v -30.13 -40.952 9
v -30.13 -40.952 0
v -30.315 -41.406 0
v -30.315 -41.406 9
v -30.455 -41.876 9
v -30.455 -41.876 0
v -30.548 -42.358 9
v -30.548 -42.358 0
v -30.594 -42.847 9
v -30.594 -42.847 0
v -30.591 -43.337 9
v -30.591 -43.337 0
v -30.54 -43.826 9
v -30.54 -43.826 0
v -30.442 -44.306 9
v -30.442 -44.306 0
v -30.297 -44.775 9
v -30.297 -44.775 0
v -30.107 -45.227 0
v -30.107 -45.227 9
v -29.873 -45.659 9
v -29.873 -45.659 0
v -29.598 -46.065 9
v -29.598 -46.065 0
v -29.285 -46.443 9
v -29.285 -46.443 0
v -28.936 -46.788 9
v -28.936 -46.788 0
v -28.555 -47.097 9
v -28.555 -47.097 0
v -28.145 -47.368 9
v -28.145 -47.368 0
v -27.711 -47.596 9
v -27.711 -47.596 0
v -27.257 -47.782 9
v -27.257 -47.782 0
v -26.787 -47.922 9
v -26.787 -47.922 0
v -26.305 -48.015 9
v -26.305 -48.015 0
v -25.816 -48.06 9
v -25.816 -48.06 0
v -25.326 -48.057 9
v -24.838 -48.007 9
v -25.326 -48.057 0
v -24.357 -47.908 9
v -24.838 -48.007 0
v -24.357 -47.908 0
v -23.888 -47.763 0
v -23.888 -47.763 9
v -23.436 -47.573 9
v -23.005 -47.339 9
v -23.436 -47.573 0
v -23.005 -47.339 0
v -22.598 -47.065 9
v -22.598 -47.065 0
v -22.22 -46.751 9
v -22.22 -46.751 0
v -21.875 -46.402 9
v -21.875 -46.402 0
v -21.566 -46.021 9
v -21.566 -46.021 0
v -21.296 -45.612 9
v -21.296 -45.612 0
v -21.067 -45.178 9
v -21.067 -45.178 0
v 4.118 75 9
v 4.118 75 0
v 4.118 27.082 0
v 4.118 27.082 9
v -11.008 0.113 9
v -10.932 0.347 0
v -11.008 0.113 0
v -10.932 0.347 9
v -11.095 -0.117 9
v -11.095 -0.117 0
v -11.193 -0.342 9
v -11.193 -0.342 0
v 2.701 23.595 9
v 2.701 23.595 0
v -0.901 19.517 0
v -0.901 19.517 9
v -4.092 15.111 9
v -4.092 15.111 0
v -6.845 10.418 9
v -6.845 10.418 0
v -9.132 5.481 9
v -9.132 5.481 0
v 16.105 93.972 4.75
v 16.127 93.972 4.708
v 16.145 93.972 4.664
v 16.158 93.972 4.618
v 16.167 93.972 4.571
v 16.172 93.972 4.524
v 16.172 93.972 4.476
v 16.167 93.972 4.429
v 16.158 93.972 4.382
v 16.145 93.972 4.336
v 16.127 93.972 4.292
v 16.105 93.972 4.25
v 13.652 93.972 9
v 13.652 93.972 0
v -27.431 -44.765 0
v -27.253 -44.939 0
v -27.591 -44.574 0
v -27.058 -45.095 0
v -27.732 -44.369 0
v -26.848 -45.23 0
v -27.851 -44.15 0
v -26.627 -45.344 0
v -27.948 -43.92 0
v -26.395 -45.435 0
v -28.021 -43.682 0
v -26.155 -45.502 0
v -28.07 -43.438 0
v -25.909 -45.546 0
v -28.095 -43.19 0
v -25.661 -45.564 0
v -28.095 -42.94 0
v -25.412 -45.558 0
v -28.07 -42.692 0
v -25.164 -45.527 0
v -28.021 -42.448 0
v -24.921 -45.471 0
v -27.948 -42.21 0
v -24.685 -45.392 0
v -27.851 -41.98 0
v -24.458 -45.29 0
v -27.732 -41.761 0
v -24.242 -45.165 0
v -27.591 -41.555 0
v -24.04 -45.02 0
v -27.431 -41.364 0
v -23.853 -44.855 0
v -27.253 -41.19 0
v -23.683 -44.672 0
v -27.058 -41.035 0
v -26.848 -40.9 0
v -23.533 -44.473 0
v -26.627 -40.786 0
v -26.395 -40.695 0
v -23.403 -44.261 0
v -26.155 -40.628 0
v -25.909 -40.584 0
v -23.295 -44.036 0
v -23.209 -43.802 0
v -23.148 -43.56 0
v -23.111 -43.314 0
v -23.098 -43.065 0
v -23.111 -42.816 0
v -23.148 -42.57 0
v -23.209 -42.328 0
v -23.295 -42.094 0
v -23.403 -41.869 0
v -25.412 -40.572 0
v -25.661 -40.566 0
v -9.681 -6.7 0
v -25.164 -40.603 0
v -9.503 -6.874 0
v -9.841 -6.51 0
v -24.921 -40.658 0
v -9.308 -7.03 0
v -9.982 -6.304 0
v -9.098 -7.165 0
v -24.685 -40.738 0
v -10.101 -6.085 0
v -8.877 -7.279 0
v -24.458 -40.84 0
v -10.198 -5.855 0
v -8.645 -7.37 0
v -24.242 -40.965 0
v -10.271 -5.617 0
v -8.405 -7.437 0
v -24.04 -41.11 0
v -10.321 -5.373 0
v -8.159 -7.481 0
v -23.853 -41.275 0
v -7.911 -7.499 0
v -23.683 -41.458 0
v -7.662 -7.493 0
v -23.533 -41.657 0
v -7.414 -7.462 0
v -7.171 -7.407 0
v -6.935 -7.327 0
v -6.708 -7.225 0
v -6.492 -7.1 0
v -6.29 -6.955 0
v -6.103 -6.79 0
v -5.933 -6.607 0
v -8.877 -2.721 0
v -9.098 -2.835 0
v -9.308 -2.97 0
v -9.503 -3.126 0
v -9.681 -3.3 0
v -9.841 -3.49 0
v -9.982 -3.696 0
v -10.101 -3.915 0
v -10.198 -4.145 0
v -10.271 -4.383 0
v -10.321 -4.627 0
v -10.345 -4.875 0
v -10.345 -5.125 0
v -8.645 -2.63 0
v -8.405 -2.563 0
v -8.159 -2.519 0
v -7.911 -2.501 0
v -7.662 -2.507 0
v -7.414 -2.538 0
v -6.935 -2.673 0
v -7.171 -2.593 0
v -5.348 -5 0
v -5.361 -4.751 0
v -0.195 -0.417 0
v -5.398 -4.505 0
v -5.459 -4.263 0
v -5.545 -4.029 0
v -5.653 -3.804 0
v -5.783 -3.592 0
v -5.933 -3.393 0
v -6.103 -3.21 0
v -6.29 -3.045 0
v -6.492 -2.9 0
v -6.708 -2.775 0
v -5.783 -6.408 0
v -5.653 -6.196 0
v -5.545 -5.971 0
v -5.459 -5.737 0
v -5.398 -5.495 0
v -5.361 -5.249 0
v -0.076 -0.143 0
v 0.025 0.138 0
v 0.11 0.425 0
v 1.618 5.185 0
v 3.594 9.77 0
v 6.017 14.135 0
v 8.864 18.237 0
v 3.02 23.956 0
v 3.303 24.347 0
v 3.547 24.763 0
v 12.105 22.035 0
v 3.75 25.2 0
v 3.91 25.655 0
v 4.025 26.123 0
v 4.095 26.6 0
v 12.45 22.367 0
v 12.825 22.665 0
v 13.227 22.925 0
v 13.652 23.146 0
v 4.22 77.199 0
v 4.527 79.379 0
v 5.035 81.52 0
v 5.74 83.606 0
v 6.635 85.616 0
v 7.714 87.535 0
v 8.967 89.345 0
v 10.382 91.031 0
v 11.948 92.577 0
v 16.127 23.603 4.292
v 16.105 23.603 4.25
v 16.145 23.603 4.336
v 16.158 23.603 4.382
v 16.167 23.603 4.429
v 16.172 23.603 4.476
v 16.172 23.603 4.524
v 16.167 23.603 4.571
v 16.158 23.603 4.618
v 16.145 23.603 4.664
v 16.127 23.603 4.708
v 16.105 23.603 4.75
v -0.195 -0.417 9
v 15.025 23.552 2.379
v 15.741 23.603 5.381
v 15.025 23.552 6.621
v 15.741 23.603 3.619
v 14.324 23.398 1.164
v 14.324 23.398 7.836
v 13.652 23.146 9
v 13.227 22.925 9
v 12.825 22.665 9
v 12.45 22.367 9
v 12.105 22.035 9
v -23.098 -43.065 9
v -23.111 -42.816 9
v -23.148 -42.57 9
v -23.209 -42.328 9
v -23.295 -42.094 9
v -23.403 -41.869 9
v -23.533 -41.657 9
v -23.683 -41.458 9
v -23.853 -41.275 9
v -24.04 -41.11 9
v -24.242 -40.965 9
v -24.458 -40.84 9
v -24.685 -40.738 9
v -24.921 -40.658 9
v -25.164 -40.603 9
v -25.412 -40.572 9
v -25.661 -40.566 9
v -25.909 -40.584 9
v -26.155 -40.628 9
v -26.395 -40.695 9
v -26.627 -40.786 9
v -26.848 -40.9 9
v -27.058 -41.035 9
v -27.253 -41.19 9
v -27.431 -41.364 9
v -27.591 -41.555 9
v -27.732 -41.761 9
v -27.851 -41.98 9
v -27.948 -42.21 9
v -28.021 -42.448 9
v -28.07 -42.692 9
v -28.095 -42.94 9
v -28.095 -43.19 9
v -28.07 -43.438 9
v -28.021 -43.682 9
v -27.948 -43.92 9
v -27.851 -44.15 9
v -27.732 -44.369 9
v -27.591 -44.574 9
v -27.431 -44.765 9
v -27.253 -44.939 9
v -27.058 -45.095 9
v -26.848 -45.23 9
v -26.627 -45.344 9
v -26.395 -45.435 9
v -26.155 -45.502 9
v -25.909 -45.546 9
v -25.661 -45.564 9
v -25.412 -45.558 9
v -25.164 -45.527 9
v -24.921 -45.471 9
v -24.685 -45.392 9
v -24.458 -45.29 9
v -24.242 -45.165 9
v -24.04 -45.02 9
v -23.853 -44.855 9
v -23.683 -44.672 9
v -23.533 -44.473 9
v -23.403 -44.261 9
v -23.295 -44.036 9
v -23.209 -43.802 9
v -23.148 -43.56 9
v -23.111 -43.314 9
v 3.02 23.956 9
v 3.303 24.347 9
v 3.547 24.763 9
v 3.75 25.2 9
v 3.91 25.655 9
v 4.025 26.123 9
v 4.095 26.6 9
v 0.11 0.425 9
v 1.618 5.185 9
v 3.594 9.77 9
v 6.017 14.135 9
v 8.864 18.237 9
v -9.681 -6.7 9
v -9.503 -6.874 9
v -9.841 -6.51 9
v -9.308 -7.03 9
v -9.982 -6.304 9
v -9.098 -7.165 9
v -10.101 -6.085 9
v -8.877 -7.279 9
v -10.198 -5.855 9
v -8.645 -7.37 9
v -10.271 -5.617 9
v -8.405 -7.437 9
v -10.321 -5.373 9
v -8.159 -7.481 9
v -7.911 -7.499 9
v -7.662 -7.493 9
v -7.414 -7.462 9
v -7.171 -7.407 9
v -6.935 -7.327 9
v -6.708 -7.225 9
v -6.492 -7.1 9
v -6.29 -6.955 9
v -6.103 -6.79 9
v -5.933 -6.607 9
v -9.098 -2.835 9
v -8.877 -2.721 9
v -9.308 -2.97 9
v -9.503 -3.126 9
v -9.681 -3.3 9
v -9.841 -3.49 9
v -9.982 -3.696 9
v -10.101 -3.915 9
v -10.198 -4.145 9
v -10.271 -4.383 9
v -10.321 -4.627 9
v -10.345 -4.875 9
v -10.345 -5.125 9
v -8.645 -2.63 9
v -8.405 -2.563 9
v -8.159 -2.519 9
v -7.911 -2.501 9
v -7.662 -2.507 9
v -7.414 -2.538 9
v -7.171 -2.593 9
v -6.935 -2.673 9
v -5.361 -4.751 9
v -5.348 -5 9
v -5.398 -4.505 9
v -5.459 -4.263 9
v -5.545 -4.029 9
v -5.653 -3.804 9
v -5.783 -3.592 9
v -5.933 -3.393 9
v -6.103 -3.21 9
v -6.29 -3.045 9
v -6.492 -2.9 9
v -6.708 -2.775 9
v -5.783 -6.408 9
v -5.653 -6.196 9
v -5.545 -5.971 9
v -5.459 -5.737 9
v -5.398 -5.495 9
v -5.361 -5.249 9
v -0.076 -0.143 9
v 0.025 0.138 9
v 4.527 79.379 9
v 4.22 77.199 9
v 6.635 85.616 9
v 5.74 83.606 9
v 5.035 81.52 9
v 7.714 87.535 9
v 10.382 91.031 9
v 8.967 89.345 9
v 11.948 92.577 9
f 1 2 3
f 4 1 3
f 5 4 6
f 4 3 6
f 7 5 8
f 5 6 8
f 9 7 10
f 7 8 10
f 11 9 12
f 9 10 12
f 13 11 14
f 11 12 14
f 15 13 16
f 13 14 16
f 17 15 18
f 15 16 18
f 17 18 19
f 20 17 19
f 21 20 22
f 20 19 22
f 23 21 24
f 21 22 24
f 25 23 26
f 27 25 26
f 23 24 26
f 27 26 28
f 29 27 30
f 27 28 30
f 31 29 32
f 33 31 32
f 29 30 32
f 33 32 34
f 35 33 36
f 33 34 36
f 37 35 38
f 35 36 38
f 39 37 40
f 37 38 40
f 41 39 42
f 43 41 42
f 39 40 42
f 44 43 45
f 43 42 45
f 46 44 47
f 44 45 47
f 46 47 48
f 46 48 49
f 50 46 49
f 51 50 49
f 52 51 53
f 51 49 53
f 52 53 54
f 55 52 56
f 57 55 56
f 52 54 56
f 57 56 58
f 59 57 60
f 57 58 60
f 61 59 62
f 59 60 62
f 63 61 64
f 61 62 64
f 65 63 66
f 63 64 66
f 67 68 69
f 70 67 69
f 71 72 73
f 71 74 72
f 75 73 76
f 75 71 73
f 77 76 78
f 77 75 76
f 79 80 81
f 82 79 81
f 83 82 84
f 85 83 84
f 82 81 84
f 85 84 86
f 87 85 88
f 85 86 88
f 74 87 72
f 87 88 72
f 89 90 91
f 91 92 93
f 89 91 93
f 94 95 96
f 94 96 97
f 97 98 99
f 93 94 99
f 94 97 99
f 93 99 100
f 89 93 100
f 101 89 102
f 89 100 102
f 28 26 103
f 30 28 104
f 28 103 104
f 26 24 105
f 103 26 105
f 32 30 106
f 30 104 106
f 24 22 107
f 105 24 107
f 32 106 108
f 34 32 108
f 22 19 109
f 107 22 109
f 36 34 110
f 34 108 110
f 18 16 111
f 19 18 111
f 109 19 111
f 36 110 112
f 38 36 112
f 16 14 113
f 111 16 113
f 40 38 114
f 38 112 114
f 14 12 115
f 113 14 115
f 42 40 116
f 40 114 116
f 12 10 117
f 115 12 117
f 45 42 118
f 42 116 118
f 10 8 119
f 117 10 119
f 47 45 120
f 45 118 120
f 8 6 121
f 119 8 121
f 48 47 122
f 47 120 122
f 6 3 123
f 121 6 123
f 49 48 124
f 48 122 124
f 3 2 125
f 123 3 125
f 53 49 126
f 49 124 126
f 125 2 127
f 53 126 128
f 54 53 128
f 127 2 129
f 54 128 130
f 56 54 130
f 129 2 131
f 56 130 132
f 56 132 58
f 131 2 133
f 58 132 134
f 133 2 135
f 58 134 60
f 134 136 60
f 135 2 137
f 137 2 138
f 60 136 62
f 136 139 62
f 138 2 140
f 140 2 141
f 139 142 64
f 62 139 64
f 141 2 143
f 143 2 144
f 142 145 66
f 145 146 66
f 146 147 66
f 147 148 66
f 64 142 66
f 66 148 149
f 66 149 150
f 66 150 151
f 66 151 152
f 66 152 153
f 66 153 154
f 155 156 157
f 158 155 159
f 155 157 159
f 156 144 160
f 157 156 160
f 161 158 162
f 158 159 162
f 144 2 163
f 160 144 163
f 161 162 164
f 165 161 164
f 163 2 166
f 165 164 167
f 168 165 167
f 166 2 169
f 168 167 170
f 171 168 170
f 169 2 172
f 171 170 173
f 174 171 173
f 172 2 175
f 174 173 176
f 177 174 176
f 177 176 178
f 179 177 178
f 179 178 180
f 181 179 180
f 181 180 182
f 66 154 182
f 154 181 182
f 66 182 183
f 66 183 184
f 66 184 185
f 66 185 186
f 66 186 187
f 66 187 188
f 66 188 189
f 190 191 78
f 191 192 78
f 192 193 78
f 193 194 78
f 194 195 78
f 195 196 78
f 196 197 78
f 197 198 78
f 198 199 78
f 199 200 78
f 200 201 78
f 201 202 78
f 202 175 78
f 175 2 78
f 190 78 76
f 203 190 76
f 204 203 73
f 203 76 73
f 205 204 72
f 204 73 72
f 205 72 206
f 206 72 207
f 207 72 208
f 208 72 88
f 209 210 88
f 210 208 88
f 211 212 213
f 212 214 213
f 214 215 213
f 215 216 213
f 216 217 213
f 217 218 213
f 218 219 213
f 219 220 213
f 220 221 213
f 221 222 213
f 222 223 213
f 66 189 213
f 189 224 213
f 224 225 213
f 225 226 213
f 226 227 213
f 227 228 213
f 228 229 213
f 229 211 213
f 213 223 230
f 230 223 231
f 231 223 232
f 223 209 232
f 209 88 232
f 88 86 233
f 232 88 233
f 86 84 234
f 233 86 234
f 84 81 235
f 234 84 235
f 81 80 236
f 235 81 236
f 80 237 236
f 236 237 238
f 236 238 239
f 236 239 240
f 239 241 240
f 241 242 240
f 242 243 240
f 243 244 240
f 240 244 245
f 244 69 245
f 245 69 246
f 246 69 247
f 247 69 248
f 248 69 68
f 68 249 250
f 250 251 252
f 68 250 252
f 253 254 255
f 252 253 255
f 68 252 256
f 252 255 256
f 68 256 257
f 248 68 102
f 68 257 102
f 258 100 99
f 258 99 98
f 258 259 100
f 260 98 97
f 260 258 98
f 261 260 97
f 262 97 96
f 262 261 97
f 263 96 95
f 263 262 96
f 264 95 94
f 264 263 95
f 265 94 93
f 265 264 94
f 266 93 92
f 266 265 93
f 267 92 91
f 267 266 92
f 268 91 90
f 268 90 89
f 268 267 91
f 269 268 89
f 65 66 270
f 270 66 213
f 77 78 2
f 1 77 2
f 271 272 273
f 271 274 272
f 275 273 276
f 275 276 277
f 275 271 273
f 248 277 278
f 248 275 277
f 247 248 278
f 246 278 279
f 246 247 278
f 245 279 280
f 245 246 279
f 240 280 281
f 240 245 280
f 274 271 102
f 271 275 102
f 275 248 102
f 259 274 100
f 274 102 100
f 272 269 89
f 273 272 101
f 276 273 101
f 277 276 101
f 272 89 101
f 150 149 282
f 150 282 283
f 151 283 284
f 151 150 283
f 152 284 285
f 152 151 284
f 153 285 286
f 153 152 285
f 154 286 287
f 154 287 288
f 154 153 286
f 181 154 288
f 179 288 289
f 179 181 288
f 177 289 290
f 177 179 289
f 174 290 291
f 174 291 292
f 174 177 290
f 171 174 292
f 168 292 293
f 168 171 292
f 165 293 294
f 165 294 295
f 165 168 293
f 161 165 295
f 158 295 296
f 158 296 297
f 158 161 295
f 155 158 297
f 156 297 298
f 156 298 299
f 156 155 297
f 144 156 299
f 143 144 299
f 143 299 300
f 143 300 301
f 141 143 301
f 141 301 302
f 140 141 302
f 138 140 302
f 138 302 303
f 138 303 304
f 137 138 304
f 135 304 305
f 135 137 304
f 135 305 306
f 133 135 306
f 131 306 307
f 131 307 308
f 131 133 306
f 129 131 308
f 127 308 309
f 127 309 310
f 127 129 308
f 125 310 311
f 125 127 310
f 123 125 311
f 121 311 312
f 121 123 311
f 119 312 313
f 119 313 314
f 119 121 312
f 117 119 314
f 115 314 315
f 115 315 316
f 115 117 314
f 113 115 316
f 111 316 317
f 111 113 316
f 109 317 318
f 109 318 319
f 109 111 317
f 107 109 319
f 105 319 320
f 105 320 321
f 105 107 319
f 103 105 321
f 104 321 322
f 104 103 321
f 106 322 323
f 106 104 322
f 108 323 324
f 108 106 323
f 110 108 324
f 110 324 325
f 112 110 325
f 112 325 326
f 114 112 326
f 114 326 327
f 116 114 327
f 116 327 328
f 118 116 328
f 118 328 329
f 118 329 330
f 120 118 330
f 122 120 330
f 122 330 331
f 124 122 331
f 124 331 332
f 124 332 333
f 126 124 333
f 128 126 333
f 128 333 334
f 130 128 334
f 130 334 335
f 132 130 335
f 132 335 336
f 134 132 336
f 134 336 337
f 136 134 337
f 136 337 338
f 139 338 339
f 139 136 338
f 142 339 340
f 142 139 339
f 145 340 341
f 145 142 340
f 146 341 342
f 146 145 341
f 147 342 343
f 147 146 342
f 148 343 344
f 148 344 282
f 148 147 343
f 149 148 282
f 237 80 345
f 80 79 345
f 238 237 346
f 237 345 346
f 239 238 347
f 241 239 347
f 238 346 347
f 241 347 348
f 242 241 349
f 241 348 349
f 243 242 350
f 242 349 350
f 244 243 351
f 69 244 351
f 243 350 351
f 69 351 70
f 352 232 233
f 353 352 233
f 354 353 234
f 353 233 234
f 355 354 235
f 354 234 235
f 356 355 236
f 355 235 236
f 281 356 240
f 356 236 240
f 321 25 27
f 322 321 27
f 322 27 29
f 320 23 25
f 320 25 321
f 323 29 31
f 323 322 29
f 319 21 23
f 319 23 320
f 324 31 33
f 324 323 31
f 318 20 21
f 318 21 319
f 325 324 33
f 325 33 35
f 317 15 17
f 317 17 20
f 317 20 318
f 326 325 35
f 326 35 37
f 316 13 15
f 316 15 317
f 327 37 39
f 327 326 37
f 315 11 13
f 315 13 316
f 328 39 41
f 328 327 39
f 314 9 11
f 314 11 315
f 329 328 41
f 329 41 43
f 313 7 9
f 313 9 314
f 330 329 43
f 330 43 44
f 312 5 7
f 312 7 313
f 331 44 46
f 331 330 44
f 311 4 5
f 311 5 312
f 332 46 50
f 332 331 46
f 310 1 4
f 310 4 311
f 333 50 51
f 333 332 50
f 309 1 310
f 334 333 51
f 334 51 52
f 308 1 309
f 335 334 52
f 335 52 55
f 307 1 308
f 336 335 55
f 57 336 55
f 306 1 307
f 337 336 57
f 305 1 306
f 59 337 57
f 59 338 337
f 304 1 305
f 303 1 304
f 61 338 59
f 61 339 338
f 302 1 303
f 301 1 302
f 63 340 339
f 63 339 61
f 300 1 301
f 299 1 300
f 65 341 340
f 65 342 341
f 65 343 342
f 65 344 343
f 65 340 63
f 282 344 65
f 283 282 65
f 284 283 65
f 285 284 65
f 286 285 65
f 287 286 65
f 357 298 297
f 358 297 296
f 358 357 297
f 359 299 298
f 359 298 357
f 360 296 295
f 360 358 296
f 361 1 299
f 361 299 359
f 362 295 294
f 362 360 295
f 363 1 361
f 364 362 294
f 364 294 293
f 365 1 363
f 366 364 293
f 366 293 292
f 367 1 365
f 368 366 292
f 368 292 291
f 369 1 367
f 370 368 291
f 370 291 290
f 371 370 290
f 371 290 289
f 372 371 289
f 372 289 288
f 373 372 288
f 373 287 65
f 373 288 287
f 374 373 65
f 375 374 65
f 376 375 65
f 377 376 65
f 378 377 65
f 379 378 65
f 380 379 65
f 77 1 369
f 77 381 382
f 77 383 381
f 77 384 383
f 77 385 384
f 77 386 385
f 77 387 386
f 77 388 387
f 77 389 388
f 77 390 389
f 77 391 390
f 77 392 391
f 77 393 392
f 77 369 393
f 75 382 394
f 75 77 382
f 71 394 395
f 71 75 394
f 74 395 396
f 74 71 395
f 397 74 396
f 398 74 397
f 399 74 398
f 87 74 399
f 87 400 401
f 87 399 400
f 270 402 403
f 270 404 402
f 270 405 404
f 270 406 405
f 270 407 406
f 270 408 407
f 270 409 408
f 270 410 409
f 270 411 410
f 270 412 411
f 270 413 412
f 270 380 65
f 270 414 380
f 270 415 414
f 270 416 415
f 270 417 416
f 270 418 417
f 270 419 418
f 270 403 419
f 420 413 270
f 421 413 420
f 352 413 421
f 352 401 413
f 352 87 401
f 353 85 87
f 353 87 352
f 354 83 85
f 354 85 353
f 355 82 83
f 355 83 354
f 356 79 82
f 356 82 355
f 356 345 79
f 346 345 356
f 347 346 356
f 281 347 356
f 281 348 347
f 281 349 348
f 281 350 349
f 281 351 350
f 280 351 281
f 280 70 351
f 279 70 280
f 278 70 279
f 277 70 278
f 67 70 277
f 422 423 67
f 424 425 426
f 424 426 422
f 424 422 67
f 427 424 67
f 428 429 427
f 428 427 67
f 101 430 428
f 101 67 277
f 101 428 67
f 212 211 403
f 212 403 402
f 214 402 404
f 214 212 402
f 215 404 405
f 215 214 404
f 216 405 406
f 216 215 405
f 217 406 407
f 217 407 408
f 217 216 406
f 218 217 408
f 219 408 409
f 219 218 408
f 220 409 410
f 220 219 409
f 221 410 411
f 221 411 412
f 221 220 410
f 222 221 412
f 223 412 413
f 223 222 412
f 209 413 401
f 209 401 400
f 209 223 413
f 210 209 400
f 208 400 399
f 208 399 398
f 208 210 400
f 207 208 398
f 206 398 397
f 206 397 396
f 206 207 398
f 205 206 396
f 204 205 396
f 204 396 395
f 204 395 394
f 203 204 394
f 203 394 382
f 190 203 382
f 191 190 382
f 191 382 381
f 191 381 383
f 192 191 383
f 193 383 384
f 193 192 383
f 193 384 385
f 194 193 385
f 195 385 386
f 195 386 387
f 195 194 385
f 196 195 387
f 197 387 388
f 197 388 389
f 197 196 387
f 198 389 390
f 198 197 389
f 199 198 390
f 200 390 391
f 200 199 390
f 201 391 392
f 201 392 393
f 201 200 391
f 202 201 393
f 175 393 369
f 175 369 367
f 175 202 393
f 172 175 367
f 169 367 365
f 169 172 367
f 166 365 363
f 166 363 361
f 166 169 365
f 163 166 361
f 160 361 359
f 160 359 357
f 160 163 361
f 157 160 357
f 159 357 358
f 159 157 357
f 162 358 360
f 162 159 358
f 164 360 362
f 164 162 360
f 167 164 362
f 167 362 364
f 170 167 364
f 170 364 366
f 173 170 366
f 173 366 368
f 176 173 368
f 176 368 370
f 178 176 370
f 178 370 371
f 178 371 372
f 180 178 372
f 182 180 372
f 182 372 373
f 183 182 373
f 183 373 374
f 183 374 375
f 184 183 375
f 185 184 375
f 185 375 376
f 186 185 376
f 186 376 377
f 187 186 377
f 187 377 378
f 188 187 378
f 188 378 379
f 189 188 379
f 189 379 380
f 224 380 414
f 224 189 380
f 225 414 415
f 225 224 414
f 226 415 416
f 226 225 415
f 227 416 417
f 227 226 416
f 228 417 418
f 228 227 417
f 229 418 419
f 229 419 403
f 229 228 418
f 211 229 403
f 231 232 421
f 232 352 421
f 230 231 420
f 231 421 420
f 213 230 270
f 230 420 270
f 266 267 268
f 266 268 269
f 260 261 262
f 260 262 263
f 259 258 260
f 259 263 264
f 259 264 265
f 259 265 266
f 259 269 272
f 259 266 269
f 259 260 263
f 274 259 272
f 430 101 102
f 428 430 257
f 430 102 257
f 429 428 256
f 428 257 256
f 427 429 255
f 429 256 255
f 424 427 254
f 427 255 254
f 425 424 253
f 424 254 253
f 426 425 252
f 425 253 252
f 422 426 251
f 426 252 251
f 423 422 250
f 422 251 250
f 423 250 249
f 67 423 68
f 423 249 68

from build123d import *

# Parameters (mm, degrees)
SKETCH1_R           = 2.5
BOSS_EXTRUDE1_DEPTH = 9
SKETCH2_W           = 1.5
SKETCH2_H           = 71.396737885
CUT_EXTRUDE1_DEPTH  = 10
BOSS_EXTRUDE2_DEPTH = 70.368354
FILLET1_R           = 0.5
FILLET2_R           = 5


with BuildPart() as part:
    # Sketch1 → Boss-Extrude1 (new body)
    with BuildSketch(Plane.XY):
        with BuildLine():
            Line((-11.03377919, 0), (-30.129933814, -40.951835747))
            ThreePointArc((-30.129933814, -40.951835747), (-27.711486187, -47.596465991), (-21.066855944, -45.178018364))
            Line((-21.066855944, -45.178018364), (0, 0))
            ThreePointArc((0, 0), (5.707925077, 13.632041213), (15.151572114, 25))
            Line((15.151572114, 25), (15.151572114, 95))
            ThreePointArc((15.151572114, 95), (7.05920736, 86.420861211), (4.117792925, 75))
            Line((4.117792925, 75), (4.117792925, 25))
            ThreePointArc((4.117792925, 25), (-5.106750503, 13.499250648), (-11.03377919, 0))
        make_face()
        with Locations((-25.598394879, -43.064927056)):
            Circle(SKETCH1_R, mode=Mode.SUBTRACT)
        with Locations((-7.848427886, -5)):
            Circle(SKETCH1_R, mode=Mode.SUBTRACT)
    extrude(amount=BOSS_EXTRUDE1_DEPTH)

    # Sketch2 → Cut-Extrude1 (cut, through all)
    with BuildSketch(Plane.XY.offset(9)):
        with Locations((14.401572114, 59.301631058)):
            Rectangle(SKETCH2_W, SKETCH2_H)
    extrude(amount=-CUT_EXTRUDE1_DEPTH, mode=Mode.SUBTRACT)

    # Sketch4 → Boss-Extrude2 (add)
    with BuildSketch(Plane(origin=(0, 93.971615681, 0), x_dir=(0, 0, -1), z_dir=(0, -1, 0))):
        Polygon((0, 13.651572114), (-4.5, 16.249648326), (-9, 13.651572114), align=None)
    extrude(amount=BOSS_EXTRUDE2_DEPTH)

    # Fillet1
    fillet1_edges = [part.edges().sort_by_distance(p)[0] for p in [
        (16.249648326, 58.787438681, 4.5),
    ]]
    fillet(fillet1_edges, radius=FILLET1_R)

    # Fillet2
    fillet2_edges = [part.edges().sort_by_distance(p)[0] for p in [
        (0, 0, 4.5),
        (-11.03377919, 0, 4.5),
        (4.117792925, 25, 4.5),
        (13.651572114, 23.603262115, 4.5),
    ]]
    fillet(fillet2_edges, radius=FILLET2_R)


solid = part.part
